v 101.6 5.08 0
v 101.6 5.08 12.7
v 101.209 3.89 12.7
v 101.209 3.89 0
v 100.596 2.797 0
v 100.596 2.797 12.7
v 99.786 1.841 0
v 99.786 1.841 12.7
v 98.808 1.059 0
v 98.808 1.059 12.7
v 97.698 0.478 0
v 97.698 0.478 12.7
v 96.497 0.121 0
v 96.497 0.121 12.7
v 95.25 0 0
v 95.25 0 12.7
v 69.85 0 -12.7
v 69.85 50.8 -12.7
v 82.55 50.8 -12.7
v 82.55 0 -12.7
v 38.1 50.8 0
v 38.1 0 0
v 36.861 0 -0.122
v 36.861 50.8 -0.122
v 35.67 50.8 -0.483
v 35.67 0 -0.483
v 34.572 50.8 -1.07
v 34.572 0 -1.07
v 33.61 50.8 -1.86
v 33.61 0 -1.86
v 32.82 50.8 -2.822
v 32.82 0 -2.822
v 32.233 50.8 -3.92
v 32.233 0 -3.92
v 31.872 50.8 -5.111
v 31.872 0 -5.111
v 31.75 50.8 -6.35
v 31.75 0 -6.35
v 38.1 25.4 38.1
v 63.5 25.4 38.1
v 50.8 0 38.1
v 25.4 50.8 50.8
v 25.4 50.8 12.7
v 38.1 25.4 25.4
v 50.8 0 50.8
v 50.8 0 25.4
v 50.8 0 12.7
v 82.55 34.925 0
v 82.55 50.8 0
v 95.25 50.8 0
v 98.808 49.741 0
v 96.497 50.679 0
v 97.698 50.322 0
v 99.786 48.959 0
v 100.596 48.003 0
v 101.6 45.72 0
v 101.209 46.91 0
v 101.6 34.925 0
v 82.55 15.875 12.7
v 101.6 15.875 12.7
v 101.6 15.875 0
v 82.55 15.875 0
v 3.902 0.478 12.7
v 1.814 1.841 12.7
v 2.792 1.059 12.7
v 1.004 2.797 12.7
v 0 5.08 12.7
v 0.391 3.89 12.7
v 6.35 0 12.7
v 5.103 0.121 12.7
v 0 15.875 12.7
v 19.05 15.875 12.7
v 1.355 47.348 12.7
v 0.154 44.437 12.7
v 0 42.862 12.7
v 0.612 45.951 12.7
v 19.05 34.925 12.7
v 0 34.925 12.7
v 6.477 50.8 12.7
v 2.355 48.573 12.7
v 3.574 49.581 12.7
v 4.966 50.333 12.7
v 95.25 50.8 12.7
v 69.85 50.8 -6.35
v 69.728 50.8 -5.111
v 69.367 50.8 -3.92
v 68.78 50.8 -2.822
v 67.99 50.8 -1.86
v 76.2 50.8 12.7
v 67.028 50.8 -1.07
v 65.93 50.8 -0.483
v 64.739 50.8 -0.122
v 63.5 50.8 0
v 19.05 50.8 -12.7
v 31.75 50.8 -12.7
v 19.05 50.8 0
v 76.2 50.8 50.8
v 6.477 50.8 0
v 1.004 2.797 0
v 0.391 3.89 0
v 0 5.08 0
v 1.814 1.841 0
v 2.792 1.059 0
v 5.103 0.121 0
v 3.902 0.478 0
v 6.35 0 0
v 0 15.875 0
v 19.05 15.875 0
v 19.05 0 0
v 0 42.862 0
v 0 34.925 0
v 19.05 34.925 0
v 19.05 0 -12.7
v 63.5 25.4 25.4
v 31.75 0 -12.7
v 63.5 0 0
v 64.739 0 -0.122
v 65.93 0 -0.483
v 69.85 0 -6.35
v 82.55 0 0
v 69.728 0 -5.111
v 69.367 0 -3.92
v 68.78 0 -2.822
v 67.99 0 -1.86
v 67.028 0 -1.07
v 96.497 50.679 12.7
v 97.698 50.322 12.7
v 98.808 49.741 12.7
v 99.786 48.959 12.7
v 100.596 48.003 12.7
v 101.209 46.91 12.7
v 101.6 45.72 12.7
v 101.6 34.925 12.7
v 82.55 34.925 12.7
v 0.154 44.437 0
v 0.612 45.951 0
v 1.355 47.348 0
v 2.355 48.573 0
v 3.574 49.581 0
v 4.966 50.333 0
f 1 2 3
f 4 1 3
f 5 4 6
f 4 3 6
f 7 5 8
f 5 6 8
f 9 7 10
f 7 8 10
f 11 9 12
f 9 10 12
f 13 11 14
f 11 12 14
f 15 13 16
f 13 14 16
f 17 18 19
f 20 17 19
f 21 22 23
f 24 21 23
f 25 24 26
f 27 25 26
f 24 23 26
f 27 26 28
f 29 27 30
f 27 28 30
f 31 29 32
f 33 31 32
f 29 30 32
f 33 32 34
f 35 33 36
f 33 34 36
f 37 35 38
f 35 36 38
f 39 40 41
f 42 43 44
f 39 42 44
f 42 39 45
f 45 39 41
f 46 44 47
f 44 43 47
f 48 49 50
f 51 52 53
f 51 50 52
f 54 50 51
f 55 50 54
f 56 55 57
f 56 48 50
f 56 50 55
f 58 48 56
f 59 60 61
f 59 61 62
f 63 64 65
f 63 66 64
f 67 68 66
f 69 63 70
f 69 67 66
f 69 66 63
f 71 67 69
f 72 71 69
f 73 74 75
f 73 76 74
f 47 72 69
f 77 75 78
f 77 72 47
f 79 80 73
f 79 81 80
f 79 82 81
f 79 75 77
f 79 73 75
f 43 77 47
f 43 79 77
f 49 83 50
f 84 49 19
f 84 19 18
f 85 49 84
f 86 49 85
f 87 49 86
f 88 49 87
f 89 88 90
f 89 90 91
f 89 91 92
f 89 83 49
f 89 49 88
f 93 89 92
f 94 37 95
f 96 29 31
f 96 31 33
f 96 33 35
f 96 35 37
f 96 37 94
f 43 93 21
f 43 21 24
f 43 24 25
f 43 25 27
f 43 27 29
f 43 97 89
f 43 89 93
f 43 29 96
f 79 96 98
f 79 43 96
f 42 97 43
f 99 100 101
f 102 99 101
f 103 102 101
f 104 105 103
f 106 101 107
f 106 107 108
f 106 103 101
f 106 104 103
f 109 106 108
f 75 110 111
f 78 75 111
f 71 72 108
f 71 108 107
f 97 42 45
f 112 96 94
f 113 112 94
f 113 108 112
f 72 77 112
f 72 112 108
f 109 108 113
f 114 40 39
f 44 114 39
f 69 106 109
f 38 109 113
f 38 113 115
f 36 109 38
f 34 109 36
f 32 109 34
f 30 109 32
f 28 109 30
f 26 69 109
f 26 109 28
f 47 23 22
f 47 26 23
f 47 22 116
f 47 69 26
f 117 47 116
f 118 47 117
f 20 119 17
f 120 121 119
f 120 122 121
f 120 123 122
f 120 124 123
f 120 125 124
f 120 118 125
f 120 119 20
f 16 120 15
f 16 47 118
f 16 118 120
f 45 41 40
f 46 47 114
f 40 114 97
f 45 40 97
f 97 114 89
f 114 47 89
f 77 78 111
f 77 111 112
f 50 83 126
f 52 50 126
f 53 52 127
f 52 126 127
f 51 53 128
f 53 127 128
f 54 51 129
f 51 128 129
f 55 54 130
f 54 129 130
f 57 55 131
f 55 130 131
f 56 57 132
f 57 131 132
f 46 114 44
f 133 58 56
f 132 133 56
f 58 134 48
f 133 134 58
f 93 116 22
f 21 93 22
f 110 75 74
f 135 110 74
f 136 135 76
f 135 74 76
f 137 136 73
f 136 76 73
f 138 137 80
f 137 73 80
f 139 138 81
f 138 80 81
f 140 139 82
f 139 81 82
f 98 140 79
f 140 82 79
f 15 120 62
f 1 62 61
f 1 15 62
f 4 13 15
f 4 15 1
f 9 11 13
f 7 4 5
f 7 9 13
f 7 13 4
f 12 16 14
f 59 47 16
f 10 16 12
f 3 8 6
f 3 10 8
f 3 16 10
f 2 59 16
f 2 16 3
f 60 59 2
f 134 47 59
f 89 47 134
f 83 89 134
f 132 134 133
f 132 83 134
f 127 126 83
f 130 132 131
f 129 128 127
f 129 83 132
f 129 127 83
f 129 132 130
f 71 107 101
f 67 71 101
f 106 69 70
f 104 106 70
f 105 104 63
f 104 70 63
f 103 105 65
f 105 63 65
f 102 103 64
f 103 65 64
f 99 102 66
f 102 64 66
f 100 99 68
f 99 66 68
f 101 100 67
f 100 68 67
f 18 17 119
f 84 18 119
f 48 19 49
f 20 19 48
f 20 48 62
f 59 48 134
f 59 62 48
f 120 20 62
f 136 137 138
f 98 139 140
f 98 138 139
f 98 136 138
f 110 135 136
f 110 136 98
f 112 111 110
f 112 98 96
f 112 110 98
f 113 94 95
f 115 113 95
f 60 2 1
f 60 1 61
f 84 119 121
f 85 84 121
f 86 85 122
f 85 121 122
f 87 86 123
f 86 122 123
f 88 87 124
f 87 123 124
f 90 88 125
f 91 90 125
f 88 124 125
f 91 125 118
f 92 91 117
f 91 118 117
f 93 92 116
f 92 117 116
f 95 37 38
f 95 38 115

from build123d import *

# Parameters (mm, degrees)
F1_DEPTH  = 12.7
F3_DEPTH  = 38.1
F4_W      = 19.05
F4_H      = 12.7
F5_DEPTH  = 50.801
F7_START  = -25.4
F6_W      = 25.4
F6_H      = 12.7
F7_DEPTH  = 72.90484
F9_DEPTH  = 25.401
F11_DEPTH = 25.401


with BuildPart() as f1:
    # F0 (on Top) → F1 (new body, symmetric)
    with BuildSketch(Plane.XY):
        Polygon((0, 15.875), (0, 0), (101.6, 0), (101.6, 15.875), (82.55, 15.875), (82.55, 34.925), (101.6, 34.925), (101.6, 50.8), (0, 50.8), (0, 34.925), (19.05, 34.925), (19.05, 15.875), align=None)
    extrude(amount=F1_DEPTH, both=True)

    # F2 (on face) → F3 (join)
    with BuildSketch(Plane.XY.offset(12.7)):
        Polygon((76.2, 50.8), (25.4, 50.8), (50.8, 0), align=None)
    extrude(amount=F3_DEPTH)

    # F4 (on face) → F5 (cut, through all)
    with BuildSketch(Plane.XZ):
        with Locations((9.525, -6.35)):
            Rectangle(F4_W, F4_H)
        with BuildLine():
            Line((31.75, -12.7), (69.85, -12.7))
            Line((69.85, -12.7), (69.85, -6.35))
            ThreePointArc((69.85, -6.35), (67.9901280605, -1.8598719395), (63.5, 0))
            Line((63.5, 0), (38.1, 0))
            ThreePointArc((38.1, 0), (33.6098719395, -1.8598719395), (31.75, -6.35))
            Line((31.75, -6.35), (31.75, -12.7))
        make_face()
        with Locations((92.075, -6.35)):
            Rectangle(F4_W, F4_H)
    extrude(amount=-F5_DEPTH, mode=Mode.SUBTRACT)

    # F6 (on face) → F7 (cut)
    with BuildSketch(Plane(origin=(0, 50.8, 0), x_dir=(-1, 0, 0), z_dir=(0, 1, 0)).offset(F7_START)):
        with Locations((-50.8, 31.75)):
            Rectangle(F6_W, F6_H)
    extrude(amount=-F7_DEPTH, mode=Mode.SUBTRACT)

    # F8 (on face) → F9 (cut, through all)
    with BuildSketch(Plane.XY.offset(12.7)):
        with BuildLine():
            Line((0, 50.8), (0, 42.8625))
            ThreePointArc((0, 42.8625), (1.8247273895, 47.9848874708), (6.4769983292, 50.8))
            Line((6.4769983292, 50.8), (0, 50.8))
        make_face()
        with BuildLine():
            ThreePointArc((6.35, 0), (2.2840161092, 1.4262701365), (0, 5.08))
            Line((0, 5.08), (0, 0))
            Line((0, 0), (6.35, 0))
        make_face()
    extrude(amount=-F9_DEPTH, mode=Mode.SUBTRACT)

    # F10 (on face) → F11 (cut, through all)
    with BuildSketch(Plane.XY.offset(12.7)):
        with BuildLine():
            Line((101.6, 50.8), (95.25, 50.8))
            ThreePointArc((95.25, 50.8), (99.3159838908, 49.3737298635), (101.6, 45.72))
            Line((101.6, 45.72), (101.6, 50.8))
        make_face()
        with BuildLine():
            ThreePointArc((101.6, 5.08), (99.3159838908, 1.4262701365), (95.25, 0))
            Line((95.25, 0), (101.6, 0))
            Line((101.6, 0), (101.6, 5.08))
        make_face()
    extrude(amount=-F11_DEPTH, mode=Mode.SUBTRACT)


solid = f1.part
